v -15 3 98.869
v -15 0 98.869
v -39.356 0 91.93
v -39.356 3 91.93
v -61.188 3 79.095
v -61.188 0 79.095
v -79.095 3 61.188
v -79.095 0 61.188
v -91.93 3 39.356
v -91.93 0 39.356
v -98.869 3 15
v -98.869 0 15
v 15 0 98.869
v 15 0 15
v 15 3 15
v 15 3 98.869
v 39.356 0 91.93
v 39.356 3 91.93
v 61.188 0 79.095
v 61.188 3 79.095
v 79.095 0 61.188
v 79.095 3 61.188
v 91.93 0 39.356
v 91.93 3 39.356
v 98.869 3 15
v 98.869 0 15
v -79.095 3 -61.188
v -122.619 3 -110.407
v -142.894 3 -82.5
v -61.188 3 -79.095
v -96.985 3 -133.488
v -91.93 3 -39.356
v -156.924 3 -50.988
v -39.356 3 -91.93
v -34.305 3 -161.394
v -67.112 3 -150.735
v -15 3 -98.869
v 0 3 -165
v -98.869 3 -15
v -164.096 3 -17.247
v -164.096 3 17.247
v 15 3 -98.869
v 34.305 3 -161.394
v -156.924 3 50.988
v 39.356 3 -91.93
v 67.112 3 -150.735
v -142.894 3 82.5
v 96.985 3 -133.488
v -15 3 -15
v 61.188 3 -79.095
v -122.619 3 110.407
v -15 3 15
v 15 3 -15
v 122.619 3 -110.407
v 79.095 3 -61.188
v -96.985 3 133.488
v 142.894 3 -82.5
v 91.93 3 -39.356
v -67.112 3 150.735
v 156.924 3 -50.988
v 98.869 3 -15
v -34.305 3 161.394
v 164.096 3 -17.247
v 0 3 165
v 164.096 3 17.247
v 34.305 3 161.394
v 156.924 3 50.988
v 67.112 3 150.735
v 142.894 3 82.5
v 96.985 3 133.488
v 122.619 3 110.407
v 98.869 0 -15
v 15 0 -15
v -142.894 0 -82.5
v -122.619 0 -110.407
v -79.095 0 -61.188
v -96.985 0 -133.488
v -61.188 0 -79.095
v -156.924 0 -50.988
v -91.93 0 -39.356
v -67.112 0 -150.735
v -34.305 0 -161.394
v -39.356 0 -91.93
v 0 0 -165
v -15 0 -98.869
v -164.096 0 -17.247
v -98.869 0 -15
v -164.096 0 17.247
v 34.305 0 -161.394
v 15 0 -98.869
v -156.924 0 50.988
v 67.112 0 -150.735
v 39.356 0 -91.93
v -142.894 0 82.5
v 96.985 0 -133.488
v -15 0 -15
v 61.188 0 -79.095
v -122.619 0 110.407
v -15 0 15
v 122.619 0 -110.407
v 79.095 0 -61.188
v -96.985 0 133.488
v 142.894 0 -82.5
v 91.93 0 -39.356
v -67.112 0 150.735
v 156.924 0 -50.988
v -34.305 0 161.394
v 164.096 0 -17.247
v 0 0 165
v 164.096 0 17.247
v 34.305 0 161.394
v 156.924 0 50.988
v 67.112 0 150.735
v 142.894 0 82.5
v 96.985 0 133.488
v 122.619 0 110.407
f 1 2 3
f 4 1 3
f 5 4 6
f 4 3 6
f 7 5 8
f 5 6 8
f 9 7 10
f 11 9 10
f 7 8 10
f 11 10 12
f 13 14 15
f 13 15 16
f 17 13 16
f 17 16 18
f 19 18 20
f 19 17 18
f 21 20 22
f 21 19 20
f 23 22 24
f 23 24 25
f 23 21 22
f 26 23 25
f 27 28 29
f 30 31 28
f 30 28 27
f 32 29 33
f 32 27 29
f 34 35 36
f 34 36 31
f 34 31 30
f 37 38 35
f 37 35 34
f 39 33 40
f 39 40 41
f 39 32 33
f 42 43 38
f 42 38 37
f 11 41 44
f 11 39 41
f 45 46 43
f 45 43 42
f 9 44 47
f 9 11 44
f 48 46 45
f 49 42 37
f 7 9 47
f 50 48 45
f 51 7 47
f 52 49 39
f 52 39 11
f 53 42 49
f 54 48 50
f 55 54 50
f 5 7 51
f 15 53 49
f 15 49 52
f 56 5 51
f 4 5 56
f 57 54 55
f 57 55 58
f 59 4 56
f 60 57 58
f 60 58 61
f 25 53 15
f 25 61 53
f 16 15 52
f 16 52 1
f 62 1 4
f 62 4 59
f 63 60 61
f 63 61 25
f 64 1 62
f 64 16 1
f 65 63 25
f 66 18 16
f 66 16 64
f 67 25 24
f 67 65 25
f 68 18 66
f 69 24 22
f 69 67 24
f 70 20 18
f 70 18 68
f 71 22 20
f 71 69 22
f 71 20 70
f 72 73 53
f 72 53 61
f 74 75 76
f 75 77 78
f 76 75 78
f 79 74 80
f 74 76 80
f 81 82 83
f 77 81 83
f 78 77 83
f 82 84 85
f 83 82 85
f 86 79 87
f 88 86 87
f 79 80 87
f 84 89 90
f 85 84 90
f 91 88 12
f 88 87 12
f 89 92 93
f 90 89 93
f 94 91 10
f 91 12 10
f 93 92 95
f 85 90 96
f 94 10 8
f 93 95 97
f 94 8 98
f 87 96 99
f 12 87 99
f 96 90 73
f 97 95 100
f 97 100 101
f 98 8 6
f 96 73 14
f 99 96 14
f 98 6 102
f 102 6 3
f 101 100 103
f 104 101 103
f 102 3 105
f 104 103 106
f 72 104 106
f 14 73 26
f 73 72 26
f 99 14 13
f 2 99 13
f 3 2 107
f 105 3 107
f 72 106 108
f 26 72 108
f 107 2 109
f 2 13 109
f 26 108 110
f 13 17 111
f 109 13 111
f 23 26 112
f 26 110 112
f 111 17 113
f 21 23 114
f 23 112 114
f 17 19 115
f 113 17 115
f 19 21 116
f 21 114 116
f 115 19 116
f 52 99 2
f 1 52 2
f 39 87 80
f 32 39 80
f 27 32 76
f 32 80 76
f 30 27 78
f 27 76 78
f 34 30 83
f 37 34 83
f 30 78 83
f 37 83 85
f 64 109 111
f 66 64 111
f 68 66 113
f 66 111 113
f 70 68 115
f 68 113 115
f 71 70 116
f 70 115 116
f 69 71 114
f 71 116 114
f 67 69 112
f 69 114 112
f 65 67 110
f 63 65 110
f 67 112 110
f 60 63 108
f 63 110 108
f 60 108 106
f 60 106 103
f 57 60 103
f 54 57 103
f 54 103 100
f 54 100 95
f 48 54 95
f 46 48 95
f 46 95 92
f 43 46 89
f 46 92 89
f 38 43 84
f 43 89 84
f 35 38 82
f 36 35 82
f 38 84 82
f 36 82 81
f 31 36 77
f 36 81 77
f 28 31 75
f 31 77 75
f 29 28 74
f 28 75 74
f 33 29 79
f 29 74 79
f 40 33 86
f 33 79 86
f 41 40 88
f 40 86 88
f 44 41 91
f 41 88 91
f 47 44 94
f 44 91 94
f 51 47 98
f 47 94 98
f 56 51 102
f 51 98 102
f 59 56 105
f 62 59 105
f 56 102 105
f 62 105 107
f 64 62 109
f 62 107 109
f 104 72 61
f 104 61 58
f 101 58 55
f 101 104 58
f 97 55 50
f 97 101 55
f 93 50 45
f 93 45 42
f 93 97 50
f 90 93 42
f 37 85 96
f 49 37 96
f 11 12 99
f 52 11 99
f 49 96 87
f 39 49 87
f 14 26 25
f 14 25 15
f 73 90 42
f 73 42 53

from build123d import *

# Parameters (mm, degrees)
SKETCH_1_R      = 165
EXTRUDE_1_DEPTH = 3


with BuildPart() as part:
    # 草图1 → 凸台-拉伸1 (new body)
    with BuildSketch(Plane(origin=(0, 0, 0), x_dir=(1, 0, 0), z_dir=(0, 1, 0))):
        with Locations(Location((0, 0, 0), (0, 0, 270))):
            Circle(SKETCH_1_R)
        with BuildLine():
            Line((-15, 98.868599666), (-15, 15))
            Line((-15, 15), (-98.868599666, 15))
            ThreePointArc((-98.868599666, 15), (-70.710678119, 70.710678119), (-15, 98.868599666))
        make_face(mode=Mode.SUBTRACT)
        with BuildLine():
            Line((15, 98.868599666), (15, 15))
            Line((15, 15), (98.868599666, 15))
            ThreePointArc((98.868599666, 15), (70.710678119, 70.710678119), (15, 98.868599666))
        make_face(mode=Mode.SUBTRACT)
        with BuildLine():
            Line((-98.868599666, -15), (-15, -15))
            Line((-15, -15), (-15, -98.868599666))
            ThreePointArc((-15, -98.868599666), (-70.710678119, -70.710678119), (-98.868599666, -15))
        make_face(mode=Mode.SUBTRACT)
        with BuildLine():
            Line((15, -15), (15, -98.868599666))
            ThreePointArc((15, -98.868599666), (70.710678119, -70.710678119), (98.868599666, -15))
            Line((98.868599666, -15), (15, -15))
        make_face(mode=Mode.SUBTRACT)
    extrude(amount=EXTRUDE_1_DEPTH)


solid = part.part
